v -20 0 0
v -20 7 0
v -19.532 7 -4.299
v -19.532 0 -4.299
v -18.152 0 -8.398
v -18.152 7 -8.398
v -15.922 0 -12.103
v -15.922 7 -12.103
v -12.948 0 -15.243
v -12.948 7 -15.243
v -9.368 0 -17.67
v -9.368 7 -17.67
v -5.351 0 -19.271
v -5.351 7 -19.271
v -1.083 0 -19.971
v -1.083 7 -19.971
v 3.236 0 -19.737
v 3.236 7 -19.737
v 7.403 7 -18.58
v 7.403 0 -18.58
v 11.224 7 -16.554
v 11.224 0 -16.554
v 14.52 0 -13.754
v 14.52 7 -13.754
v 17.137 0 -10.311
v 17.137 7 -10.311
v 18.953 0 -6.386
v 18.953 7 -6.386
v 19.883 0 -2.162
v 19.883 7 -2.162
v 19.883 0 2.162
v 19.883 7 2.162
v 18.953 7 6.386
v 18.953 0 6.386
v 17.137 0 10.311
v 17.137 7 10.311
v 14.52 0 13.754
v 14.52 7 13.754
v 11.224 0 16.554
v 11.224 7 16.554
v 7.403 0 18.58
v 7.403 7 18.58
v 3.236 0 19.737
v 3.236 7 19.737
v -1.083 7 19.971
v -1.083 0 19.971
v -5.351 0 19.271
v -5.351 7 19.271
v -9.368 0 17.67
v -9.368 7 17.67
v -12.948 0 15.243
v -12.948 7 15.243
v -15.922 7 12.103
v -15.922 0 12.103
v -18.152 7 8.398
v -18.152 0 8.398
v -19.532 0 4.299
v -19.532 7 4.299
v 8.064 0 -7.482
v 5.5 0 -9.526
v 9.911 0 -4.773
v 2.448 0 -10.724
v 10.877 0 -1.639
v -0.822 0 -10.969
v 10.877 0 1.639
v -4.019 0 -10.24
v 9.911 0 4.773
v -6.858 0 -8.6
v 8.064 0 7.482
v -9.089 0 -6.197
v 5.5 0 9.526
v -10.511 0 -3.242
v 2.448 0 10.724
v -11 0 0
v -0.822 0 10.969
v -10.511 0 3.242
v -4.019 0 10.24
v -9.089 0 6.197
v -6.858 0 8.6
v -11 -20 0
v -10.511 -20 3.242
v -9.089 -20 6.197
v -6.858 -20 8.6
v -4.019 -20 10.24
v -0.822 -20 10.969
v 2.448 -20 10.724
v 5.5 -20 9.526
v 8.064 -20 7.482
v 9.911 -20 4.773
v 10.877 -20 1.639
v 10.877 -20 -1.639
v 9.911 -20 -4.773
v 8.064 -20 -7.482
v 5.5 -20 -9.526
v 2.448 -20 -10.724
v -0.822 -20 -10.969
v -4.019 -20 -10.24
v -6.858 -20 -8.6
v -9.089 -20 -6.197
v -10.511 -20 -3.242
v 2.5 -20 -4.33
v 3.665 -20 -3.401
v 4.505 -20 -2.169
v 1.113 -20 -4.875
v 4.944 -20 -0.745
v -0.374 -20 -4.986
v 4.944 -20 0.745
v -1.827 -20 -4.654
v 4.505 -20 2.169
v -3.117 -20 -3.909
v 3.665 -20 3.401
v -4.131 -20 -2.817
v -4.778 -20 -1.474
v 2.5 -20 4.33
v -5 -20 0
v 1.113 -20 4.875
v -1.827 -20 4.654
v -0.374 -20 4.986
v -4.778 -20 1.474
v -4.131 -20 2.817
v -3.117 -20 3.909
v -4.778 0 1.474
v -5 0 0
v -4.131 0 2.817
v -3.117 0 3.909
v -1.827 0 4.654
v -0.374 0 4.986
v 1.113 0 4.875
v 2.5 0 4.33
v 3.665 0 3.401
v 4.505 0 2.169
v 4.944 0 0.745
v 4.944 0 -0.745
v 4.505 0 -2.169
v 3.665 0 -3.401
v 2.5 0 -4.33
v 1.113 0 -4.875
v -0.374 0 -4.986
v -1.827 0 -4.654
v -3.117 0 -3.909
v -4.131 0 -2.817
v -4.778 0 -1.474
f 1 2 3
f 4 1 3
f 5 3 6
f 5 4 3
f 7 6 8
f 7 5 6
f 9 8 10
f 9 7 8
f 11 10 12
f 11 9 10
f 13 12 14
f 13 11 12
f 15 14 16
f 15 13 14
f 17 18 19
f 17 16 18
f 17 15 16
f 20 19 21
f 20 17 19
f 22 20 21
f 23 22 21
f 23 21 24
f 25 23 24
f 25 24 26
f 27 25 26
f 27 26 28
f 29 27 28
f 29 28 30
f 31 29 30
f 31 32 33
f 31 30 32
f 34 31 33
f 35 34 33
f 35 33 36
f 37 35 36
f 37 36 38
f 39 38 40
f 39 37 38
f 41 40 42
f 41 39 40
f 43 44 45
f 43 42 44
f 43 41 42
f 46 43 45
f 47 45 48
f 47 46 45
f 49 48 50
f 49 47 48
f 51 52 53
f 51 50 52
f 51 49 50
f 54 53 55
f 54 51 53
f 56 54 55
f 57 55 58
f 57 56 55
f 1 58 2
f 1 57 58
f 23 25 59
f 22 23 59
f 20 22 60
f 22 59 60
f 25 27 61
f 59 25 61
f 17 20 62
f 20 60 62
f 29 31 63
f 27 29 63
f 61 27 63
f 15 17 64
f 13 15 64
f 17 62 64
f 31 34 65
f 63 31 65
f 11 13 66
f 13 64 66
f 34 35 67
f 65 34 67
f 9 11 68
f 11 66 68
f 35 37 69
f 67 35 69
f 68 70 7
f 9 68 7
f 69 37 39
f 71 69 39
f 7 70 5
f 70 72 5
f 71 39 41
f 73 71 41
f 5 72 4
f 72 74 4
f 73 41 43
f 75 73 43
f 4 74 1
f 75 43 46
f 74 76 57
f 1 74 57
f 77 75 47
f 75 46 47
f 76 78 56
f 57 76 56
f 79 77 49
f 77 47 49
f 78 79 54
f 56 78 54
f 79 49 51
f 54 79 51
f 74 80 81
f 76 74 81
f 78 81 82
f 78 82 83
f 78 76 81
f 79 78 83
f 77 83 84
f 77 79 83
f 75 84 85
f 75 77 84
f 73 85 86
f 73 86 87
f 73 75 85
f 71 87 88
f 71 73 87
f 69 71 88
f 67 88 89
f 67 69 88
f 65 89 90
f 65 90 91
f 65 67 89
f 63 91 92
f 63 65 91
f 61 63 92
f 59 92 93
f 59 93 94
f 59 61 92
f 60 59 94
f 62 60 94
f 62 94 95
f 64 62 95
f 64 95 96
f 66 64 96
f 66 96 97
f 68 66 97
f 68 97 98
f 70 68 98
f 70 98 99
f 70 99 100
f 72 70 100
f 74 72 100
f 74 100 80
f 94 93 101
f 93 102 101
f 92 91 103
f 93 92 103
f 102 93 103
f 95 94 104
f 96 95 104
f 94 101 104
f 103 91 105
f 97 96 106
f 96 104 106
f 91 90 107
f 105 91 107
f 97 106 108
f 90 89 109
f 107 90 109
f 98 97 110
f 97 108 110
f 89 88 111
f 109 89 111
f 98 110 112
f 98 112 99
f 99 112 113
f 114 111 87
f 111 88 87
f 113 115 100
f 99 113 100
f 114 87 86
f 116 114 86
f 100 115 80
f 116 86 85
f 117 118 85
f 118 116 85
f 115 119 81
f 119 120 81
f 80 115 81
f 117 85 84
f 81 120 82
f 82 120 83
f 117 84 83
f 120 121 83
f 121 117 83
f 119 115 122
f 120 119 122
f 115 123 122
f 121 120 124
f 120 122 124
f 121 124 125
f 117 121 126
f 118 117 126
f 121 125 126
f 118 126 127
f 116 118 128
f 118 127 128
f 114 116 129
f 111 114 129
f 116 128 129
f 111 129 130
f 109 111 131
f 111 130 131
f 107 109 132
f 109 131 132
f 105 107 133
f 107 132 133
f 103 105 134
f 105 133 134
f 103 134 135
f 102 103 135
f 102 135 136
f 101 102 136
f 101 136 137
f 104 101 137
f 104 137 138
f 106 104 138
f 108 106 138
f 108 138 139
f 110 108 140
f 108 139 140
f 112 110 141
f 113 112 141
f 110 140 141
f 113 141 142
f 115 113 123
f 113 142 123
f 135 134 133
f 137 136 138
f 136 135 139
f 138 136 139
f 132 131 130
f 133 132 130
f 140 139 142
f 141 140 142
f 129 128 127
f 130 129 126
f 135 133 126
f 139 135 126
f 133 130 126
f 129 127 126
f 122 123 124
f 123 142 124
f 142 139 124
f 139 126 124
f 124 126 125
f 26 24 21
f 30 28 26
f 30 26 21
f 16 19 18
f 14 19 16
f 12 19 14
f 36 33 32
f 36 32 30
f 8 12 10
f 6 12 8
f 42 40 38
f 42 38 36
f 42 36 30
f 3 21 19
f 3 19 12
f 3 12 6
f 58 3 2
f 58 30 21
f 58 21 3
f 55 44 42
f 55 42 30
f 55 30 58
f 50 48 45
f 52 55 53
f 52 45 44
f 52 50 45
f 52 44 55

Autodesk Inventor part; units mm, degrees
ref_plane "YZ Plane" through (0, 0, 0) normal (1, 0, 0) x (0, 1, 0)
ref_plane "XZ Plane" through (0, 0, 0) normal (0, 1, 0) x (-1, 0, 0)
ref_plane "XY Plane" through (0, 0, 0) normal (0, 0, 1) x (1, 0, 0)
sketch "Sketch1" plane through (0, 0, 0) normal (0, 1, 0) x (-1, 0, 0)
  circle A0 centre (0, 0) radius 20
  circle A1 centre (0, 0) radius 11
  circle A2 centre (0, 0) radius 5
  dimension "d0" = 40
  dimension "d1" = 22
  dimension "d4" = 10
extrude "Extrusion1" add sketch "Sketch1" along normal blind 7 contours A0 | A1 | A2
extrude "Extrusion2" add sketch "Sketch1" against normal blind 20 contours A1
properties part number "11T-Sprocket"
